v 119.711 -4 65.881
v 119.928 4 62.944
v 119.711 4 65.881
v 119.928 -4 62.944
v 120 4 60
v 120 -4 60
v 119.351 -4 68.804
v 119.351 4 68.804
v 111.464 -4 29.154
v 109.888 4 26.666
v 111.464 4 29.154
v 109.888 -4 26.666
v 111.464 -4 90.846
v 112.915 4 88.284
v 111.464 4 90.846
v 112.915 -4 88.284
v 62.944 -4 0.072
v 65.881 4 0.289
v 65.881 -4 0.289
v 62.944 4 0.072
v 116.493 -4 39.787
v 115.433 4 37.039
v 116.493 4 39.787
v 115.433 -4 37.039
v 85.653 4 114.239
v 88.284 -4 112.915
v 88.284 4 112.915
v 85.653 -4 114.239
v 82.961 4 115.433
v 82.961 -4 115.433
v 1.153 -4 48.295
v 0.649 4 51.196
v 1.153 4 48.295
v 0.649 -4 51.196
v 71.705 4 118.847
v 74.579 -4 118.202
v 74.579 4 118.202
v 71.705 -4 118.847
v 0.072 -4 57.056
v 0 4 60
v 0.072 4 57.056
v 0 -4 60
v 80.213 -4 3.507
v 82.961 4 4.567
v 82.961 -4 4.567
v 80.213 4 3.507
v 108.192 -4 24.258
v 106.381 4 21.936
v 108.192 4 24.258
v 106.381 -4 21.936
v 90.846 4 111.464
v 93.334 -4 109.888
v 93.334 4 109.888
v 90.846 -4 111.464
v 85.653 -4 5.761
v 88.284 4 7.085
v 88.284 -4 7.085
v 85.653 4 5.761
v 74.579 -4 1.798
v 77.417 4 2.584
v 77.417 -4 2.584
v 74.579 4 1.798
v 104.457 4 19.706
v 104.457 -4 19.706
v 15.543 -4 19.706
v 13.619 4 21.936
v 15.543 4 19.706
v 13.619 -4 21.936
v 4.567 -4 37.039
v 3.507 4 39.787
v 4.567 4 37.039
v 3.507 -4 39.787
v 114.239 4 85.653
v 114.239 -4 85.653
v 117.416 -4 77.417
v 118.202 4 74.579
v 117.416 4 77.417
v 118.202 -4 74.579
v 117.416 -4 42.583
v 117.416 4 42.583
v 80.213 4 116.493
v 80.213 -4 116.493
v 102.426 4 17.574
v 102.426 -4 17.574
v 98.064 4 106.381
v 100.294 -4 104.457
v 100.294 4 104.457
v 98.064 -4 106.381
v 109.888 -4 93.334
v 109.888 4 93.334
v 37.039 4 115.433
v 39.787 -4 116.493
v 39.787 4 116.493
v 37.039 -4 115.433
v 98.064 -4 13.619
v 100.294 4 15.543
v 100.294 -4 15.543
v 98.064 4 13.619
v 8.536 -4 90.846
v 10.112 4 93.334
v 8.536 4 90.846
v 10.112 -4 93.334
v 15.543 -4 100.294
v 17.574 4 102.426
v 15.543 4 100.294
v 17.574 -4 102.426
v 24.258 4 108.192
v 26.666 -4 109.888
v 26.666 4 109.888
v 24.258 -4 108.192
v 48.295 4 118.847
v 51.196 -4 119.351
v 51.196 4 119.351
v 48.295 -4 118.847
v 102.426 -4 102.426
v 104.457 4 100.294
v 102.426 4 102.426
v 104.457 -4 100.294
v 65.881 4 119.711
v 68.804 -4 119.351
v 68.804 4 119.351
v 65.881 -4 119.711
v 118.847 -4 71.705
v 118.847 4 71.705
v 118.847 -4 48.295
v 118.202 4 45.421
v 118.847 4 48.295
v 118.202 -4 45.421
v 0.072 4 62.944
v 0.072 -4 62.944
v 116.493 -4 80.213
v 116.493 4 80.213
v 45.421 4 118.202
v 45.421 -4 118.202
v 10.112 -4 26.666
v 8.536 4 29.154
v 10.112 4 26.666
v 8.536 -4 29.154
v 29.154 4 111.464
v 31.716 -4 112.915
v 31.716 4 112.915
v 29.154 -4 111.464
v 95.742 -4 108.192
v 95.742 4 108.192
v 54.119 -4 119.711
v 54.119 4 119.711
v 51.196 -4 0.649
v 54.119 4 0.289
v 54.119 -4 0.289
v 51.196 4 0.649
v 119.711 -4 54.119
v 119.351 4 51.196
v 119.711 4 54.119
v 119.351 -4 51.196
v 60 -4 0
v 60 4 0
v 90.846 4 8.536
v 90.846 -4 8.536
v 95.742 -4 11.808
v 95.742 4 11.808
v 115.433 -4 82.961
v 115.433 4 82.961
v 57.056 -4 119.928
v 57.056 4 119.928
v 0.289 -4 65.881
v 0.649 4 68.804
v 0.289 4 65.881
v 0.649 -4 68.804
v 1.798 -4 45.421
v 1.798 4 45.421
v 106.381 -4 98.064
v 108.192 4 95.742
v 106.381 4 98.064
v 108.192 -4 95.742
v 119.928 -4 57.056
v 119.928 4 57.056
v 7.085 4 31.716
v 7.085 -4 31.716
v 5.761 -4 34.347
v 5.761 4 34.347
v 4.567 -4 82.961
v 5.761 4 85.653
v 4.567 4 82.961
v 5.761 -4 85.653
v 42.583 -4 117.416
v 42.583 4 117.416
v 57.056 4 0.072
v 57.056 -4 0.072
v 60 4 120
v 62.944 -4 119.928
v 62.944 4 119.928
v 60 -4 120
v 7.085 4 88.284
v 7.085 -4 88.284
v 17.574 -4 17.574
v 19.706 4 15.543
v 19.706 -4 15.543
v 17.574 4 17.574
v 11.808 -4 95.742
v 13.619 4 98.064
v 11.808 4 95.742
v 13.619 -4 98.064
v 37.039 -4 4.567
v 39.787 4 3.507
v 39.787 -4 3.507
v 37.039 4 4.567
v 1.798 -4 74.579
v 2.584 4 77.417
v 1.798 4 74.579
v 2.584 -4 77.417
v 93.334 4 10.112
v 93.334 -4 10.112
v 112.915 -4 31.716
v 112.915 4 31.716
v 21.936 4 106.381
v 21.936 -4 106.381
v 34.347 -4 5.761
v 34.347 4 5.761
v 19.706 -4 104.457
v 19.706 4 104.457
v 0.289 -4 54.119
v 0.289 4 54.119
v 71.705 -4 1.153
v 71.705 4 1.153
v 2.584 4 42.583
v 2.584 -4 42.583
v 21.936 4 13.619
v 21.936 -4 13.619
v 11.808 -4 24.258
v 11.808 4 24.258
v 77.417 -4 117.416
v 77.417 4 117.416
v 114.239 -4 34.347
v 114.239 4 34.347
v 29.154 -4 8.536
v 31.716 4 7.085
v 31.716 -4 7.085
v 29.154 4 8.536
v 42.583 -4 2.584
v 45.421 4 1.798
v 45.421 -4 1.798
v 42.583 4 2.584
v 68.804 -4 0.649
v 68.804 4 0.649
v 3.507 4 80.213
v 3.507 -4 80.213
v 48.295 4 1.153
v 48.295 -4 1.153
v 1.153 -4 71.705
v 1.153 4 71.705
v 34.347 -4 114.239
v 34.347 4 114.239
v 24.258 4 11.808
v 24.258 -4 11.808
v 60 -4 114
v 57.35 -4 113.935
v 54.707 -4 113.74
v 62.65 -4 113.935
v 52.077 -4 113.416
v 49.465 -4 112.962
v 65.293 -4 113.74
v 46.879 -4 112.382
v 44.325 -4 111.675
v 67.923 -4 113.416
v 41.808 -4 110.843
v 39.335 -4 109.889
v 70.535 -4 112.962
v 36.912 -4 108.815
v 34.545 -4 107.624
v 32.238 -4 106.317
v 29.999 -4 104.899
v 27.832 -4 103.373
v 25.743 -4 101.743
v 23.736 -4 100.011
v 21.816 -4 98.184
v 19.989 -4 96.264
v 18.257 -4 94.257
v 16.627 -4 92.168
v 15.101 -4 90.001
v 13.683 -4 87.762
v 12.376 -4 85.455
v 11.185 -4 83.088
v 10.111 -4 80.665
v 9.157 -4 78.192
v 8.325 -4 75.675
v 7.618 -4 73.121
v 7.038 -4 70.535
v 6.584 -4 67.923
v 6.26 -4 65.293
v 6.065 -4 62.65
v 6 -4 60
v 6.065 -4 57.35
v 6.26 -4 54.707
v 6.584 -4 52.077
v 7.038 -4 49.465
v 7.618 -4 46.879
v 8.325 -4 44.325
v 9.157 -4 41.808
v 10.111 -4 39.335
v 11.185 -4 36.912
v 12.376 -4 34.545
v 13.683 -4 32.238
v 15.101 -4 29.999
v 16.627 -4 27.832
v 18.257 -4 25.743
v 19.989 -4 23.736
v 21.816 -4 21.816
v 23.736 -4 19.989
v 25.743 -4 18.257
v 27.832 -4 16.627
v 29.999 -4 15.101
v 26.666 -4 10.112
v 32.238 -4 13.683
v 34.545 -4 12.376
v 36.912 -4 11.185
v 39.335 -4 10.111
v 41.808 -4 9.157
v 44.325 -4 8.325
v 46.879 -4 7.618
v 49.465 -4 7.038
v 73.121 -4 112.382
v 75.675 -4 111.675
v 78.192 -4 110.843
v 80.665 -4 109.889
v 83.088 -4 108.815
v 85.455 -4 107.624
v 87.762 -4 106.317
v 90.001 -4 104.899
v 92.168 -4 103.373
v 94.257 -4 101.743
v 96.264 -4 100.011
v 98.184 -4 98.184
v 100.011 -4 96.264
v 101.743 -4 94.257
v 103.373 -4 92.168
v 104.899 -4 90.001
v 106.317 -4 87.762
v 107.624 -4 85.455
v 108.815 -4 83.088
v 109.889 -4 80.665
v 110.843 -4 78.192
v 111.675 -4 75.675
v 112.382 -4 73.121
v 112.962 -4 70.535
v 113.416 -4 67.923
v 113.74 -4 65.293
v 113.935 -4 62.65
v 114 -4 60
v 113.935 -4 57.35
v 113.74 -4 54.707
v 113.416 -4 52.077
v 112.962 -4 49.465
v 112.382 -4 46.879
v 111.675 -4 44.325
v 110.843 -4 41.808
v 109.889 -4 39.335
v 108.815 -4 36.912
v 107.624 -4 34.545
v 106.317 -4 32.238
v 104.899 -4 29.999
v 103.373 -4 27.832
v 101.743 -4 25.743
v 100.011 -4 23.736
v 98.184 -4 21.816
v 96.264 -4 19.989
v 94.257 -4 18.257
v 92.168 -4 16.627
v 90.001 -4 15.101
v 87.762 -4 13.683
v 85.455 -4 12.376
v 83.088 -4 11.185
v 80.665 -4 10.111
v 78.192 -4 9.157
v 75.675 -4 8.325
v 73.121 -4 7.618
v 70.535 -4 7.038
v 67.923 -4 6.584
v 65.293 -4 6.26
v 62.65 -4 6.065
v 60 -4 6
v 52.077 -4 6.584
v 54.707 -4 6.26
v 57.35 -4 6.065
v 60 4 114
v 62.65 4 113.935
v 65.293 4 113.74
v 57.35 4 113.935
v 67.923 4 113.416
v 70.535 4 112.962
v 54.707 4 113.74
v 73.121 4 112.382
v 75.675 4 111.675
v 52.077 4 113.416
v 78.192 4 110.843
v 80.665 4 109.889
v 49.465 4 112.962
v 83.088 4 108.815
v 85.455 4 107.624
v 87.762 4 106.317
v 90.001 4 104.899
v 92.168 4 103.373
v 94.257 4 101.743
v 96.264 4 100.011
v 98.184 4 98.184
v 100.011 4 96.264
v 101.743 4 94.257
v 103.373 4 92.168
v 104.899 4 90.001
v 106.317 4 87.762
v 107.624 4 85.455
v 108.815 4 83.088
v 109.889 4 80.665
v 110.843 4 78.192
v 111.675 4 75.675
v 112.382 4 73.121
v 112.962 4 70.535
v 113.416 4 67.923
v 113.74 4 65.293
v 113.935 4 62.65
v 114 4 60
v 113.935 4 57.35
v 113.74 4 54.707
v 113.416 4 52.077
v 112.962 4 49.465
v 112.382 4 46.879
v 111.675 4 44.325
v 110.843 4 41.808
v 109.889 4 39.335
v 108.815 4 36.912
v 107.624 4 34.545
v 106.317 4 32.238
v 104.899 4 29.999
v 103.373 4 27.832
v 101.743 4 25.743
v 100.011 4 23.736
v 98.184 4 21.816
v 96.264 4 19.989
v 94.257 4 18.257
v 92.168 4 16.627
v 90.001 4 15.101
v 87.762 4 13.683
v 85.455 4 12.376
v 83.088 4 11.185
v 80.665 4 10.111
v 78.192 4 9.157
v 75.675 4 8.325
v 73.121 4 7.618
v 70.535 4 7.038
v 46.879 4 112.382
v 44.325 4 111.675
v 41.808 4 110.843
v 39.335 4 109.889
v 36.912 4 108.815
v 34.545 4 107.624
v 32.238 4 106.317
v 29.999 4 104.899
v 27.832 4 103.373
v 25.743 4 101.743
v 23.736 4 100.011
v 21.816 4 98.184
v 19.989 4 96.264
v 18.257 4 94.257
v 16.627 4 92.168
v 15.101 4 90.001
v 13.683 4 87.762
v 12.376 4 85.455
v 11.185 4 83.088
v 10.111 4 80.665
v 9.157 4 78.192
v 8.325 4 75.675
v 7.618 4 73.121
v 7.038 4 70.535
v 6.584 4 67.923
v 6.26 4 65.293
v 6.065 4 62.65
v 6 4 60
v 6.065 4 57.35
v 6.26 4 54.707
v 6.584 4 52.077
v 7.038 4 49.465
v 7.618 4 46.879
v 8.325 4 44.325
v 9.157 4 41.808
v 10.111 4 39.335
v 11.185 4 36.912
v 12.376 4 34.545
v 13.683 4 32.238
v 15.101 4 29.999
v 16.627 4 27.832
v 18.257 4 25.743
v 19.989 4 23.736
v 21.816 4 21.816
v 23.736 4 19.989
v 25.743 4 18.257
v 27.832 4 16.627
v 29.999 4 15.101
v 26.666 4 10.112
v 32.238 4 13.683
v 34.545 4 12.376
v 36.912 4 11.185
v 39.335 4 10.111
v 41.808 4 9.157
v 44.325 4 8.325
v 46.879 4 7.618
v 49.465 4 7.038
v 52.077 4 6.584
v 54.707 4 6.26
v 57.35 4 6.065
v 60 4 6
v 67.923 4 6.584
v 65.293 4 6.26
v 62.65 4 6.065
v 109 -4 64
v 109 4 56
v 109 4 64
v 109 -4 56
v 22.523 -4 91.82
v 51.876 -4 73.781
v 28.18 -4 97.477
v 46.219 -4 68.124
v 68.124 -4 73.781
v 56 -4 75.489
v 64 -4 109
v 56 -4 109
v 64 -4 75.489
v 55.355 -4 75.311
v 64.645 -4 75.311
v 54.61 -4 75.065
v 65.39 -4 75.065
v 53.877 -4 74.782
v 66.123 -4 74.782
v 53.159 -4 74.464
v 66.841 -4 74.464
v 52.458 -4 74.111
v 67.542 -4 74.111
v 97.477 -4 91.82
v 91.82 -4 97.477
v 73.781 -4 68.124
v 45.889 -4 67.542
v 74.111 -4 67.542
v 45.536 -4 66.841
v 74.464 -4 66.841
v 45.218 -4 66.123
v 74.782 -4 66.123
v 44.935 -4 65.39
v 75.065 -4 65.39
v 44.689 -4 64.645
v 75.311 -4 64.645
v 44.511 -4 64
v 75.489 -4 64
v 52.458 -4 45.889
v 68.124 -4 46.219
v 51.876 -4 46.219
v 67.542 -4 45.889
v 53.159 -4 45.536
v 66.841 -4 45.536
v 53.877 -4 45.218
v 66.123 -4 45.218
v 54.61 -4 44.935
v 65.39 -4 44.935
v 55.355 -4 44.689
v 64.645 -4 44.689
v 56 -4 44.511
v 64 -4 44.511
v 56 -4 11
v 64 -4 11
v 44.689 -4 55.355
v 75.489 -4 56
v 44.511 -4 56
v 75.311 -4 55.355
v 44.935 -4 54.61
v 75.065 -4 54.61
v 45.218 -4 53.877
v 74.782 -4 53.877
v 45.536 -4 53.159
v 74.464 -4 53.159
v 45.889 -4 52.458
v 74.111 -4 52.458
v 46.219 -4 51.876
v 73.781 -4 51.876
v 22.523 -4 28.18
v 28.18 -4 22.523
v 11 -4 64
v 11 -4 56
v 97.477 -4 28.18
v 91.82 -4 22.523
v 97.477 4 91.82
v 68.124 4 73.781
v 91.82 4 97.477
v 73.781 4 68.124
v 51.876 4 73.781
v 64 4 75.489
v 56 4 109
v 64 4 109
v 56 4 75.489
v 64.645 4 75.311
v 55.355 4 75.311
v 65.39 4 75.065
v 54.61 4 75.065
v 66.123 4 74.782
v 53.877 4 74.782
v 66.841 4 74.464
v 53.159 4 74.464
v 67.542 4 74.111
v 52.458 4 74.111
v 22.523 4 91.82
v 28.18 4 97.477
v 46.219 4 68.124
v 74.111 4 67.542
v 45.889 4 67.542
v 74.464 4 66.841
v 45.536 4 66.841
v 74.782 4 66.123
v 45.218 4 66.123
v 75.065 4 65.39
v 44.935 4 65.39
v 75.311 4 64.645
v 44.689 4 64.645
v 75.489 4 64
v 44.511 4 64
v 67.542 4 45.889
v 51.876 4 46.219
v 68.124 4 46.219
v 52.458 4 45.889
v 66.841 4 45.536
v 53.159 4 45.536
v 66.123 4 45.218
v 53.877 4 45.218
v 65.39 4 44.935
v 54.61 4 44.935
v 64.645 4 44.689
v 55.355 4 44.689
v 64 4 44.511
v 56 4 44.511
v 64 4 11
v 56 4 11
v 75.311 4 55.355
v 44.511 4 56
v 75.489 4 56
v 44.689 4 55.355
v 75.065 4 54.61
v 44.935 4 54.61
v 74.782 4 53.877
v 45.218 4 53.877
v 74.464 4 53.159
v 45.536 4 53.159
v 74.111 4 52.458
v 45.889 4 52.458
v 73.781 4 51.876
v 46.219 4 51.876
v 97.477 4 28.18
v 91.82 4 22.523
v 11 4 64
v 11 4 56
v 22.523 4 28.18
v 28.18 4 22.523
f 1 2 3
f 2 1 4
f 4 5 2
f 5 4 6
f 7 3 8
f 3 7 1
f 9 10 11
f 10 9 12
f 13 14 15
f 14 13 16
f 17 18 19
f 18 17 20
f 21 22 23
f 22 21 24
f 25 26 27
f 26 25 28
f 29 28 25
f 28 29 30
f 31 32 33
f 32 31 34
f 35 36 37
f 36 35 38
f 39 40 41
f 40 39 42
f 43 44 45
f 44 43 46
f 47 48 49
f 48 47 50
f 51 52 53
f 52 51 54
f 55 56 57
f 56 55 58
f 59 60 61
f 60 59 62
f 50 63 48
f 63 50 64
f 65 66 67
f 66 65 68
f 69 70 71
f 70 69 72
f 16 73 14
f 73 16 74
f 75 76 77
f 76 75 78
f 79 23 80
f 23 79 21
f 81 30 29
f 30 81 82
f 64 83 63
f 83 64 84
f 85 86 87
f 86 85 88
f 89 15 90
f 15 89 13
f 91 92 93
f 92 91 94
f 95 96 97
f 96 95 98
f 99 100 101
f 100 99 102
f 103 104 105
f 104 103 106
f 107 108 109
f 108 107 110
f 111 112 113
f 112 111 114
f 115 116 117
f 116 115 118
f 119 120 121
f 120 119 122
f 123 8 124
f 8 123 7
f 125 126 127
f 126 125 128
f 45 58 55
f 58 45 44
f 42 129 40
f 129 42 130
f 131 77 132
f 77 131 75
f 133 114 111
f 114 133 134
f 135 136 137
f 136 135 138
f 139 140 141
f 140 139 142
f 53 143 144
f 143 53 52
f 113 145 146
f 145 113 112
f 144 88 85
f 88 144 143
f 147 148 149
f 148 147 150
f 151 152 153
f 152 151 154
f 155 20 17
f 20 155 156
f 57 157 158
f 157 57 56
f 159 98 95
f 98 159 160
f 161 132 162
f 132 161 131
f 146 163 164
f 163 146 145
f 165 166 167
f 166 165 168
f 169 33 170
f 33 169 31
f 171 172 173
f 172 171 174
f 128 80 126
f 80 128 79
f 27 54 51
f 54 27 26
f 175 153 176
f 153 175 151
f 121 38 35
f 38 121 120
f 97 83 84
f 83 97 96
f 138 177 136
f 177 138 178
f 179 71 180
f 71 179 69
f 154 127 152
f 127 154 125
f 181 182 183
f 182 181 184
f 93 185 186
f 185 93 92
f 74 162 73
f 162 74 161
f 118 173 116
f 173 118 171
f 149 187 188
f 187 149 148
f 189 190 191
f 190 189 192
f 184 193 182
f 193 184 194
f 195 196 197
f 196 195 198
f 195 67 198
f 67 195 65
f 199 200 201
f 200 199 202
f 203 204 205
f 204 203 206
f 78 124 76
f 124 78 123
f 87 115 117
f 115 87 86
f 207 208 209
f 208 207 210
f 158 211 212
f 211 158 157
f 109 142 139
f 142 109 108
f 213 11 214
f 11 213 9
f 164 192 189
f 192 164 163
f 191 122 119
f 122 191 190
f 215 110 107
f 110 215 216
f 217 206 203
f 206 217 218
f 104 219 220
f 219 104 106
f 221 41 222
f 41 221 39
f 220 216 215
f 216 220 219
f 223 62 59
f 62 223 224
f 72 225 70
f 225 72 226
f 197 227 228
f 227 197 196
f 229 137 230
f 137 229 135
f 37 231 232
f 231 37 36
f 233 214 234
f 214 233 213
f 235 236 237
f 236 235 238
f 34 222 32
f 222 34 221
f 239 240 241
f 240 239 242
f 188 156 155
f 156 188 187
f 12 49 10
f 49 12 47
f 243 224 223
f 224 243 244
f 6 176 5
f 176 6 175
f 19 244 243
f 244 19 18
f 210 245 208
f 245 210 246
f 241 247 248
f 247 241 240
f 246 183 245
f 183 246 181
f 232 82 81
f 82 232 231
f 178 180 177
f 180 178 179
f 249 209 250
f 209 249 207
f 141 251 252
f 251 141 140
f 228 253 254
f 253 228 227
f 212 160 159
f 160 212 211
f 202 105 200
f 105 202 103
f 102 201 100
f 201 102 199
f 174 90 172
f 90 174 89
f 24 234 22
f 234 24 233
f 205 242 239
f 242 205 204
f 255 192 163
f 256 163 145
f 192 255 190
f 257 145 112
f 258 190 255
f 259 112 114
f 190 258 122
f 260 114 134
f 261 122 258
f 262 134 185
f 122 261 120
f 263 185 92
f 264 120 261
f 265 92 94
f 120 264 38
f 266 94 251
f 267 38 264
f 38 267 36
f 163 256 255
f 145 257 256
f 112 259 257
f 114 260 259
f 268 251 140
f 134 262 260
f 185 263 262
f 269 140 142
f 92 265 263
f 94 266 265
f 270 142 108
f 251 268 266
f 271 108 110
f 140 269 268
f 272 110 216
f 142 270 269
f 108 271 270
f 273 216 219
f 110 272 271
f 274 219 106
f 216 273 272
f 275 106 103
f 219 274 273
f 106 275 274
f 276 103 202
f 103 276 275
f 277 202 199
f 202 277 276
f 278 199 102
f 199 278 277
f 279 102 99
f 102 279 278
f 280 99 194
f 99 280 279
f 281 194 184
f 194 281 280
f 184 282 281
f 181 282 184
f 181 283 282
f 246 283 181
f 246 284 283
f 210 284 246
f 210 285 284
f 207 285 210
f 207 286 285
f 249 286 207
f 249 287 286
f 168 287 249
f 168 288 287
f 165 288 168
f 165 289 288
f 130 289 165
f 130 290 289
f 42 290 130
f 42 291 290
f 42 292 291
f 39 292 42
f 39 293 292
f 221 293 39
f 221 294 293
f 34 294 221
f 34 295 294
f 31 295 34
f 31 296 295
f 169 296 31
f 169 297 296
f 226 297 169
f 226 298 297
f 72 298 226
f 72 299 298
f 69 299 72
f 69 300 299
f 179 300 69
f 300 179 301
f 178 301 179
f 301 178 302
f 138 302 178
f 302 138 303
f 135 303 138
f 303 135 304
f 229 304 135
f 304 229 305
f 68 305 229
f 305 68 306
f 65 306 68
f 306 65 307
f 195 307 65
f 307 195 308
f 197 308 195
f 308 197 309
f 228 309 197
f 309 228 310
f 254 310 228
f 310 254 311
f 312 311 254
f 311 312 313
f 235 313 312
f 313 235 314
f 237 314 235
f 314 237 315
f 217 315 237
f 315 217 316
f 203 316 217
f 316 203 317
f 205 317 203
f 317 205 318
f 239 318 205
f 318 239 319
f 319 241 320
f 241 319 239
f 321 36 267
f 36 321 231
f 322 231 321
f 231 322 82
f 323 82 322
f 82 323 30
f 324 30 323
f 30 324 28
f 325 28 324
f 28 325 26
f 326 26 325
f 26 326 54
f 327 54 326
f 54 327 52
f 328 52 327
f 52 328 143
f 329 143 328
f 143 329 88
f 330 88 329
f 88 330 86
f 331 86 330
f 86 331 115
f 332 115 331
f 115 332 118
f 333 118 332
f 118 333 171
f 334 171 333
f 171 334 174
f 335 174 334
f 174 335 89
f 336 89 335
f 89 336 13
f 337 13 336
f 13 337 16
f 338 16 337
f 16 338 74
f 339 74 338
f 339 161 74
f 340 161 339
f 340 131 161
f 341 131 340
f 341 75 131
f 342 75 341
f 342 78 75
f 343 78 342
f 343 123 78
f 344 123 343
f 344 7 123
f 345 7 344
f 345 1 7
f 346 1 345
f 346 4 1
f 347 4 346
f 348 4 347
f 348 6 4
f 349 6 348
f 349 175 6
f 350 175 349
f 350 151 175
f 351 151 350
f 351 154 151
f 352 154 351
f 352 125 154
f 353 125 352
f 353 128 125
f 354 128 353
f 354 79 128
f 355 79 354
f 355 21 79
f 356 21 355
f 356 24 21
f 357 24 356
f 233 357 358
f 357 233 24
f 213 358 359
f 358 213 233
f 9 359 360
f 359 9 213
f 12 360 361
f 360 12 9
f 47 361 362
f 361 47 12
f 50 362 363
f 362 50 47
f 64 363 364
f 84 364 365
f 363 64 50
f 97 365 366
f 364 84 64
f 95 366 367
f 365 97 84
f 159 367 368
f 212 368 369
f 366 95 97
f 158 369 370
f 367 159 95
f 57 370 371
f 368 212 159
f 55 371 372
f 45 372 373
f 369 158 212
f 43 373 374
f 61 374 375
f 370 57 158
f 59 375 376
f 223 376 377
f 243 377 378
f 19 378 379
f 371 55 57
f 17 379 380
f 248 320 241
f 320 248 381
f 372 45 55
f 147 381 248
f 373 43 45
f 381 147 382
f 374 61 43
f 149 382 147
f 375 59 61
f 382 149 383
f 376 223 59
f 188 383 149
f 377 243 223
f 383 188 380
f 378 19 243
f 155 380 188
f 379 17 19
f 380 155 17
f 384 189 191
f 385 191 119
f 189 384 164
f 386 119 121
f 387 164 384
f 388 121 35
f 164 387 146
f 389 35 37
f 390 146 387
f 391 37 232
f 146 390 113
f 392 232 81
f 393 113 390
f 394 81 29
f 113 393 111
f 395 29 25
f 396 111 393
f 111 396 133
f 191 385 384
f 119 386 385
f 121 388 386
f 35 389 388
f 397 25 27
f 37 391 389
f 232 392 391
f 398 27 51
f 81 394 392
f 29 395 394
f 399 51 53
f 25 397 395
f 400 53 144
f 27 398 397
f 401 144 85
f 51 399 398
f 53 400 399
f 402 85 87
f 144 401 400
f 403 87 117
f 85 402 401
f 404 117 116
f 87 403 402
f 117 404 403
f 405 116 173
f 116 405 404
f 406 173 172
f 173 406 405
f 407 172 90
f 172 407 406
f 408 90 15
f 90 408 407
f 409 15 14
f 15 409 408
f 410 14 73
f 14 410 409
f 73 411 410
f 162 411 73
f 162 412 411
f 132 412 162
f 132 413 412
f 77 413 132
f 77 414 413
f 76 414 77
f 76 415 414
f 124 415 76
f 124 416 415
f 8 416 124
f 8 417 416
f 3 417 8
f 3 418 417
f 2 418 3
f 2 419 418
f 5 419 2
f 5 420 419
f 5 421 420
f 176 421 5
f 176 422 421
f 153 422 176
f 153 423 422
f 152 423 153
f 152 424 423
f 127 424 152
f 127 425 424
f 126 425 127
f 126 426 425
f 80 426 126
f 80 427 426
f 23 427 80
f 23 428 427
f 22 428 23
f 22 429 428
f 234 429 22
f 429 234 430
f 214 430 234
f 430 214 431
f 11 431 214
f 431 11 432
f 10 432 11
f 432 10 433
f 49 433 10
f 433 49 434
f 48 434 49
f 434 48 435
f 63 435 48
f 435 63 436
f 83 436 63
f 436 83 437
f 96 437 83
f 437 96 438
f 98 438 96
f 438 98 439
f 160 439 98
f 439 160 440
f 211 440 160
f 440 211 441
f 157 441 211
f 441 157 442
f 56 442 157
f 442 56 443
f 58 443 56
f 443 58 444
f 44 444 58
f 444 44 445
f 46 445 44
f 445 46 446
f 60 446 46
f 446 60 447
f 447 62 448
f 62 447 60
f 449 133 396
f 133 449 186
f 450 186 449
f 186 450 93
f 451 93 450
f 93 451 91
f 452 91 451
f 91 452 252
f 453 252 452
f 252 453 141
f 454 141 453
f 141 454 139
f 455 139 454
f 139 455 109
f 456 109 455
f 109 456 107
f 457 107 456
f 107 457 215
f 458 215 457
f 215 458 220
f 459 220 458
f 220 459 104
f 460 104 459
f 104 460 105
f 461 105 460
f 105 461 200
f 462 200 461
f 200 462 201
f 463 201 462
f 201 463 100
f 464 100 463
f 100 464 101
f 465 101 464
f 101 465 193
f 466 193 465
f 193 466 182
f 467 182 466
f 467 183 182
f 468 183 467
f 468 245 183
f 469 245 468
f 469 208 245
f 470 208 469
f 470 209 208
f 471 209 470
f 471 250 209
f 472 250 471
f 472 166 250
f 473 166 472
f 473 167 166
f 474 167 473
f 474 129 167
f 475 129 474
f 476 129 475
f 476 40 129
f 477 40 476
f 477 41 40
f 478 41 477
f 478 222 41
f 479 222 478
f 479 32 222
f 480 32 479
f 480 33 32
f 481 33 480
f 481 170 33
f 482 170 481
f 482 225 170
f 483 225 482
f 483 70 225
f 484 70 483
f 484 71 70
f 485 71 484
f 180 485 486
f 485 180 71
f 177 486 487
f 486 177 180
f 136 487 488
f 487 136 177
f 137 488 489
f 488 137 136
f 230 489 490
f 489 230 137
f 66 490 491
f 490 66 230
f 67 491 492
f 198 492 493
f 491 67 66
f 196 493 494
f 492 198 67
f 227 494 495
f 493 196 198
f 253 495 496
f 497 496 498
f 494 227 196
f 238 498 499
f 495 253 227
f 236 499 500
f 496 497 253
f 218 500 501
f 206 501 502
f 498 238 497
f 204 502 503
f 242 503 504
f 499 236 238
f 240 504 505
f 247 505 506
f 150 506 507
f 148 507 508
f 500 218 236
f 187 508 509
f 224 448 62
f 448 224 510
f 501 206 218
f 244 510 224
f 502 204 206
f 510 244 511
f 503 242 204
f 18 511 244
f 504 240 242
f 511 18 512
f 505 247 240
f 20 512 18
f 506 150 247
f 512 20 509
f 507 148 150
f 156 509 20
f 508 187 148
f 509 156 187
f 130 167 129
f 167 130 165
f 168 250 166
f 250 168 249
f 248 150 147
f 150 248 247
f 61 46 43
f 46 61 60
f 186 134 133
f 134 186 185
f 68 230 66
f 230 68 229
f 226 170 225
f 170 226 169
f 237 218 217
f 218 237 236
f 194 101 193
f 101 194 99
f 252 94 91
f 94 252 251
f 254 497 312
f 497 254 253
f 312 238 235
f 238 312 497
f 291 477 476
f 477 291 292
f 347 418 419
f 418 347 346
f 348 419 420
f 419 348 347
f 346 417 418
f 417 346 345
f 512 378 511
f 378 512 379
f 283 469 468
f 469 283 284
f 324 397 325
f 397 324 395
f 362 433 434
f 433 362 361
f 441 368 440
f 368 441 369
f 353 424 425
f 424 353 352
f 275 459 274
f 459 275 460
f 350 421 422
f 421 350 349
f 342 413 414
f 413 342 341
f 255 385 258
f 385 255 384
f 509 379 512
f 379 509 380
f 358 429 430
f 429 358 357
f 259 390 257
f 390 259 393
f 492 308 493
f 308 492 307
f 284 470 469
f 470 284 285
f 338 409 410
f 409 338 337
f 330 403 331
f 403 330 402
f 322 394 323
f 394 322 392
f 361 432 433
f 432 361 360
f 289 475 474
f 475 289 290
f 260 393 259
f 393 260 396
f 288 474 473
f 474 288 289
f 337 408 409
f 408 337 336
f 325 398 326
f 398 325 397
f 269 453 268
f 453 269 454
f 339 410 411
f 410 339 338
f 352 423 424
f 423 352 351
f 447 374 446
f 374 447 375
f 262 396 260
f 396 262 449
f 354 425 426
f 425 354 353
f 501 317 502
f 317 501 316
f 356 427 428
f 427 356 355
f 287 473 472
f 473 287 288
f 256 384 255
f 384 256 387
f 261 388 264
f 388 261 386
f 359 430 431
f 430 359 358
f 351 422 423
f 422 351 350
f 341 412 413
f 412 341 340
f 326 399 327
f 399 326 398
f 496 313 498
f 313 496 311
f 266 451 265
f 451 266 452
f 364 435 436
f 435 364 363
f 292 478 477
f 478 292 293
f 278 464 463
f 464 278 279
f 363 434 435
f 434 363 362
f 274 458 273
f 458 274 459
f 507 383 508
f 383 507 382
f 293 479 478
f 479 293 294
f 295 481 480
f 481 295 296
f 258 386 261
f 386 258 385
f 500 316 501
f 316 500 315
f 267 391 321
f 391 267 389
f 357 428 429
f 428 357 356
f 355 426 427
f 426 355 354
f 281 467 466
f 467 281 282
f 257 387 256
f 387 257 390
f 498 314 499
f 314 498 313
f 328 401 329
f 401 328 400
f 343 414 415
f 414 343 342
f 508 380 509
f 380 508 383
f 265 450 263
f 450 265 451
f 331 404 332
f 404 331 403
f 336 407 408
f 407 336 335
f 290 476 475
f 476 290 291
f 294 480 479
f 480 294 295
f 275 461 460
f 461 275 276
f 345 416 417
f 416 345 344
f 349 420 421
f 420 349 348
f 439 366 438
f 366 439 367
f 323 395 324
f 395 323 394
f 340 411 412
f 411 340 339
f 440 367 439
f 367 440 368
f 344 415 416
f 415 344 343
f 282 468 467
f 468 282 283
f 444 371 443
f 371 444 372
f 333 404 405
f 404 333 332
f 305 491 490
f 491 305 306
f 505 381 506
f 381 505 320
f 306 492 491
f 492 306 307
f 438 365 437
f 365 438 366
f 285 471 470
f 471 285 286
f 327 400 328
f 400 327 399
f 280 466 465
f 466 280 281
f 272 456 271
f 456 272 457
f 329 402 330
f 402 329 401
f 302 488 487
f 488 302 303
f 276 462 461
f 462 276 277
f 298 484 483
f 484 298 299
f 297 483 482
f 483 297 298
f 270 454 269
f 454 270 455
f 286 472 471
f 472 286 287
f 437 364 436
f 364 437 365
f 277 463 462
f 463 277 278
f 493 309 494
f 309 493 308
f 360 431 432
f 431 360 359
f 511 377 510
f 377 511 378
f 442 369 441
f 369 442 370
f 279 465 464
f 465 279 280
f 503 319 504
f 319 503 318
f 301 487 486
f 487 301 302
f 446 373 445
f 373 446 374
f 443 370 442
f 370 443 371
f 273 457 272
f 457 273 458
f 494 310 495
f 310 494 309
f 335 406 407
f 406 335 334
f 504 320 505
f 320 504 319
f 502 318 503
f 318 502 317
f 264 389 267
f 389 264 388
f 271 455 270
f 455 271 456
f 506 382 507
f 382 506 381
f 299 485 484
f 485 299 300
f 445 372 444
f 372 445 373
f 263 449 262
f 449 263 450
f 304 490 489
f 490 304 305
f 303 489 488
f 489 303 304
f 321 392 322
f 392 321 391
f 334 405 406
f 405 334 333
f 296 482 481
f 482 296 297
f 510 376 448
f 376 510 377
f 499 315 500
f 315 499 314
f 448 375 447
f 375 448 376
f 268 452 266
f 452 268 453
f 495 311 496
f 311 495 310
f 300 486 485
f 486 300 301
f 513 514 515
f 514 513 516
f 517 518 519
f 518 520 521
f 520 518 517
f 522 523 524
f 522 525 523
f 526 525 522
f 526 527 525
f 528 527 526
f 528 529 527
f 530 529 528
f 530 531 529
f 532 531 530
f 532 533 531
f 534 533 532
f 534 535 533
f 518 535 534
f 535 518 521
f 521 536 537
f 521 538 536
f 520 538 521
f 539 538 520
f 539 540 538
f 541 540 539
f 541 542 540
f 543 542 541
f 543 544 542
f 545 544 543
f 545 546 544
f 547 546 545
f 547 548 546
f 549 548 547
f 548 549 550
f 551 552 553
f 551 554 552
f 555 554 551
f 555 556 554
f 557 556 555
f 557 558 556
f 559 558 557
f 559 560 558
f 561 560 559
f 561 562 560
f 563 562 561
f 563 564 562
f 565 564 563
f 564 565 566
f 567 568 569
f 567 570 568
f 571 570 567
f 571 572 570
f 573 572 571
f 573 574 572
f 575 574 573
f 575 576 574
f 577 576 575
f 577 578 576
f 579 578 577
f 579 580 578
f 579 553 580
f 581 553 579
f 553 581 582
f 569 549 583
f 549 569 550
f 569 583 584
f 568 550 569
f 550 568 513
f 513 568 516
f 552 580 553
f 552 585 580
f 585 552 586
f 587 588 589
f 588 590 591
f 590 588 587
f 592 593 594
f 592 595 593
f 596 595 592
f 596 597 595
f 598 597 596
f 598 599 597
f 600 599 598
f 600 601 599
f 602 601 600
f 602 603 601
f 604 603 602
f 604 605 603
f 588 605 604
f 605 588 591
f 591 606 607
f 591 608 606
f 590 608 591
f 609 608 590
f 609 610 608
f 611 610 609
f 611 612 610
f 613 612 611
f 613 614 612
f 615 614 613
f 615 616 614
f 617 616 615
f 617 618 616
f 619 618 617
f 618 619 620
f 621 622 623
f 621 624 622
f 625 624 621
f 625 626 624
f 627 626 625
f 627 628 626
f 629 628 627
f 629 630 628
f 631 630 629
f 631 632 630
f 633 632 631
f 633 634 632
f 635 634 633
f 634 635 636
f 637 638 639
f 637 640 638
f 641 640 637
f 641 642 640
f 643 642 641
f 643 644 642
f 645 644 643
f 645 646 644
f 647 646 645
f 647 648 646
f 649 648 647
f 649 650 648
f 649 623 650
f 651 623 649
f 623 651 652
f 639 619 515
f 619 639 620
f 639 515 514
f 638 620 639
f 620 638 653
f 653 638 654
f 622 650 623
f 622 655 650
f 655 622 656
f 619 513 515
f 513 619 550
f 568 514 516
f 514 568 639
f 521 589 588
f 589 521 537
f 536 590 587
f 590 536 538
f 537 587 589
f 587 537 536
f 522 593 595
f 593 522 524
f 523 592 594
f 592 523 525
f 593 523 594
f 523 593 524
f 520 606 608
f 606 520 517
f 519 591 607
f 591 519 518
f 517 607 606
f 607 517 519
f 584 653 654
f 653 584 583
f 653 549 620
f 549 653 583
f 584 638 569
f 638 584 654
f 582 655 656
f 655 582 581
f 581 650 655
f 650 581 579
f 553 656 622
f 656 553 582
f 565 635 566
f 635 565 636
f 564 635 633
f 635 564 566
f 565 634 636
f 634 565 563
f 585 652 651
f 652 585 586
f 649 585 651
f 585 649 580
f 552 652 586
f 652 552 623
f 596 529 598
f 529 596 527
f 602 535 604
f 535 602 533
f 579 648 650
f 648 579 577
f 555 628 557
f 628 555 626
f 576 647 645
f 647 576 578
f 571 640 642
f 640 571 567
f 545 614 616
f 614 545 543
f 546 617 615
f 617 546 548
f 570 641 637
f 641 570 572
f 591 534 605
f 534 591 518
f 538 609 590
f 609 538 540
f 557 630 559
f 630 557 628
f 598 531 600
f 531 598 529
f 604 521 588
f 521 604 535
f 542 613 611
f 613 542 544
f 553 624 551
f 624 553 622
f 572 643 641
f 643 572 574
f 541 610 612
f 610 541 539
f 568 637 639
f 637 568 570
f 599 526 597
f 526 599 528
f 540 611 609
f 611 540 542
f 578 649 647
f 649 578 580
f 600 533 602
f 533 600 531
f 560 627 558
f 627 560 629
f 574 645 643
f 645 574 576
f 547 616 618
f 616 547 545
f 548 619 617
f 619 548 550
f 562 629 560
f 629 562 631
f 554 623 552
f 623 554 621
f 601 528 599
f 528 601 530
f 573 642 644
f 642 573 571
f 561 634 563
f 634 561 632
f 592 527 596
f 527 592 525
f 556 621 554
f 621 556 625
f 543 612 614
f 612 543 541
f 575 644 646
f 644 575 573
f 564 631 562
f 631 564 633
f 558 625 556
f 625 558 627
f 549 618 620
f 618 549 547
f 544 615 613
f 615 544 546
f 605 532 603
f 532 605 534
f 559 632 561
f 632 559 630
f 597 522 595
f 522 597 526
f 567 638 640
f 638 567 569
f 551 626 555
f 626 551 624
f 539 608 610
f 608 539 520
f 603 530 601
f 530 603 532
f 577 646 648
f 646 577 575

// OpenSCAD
$fn=128;
/* doodle-meta {"version":1,"parameters":{"outer_diameter":{"label":"Outer diameter","description":"Outer rim diameter","unit":"mm"},"hub_diameter":{"label":"Hub","description":"Hub diameter","unit":"mm"},"spoke_width":{"label":"Spoke width","description":"Spoke bar thickness","unit":"mm"}}} */
// Wheel lies in XZ. BROKEN: spokes stop 5 mm short of the rim inner wall.
outer_diameter = 120; // mm
rim_inner_diameter = 108; // mm
hub_diameter = 32; // mm
thickness = 8; // mm
spoke_count = 8; // count
spoke_width = 8; // mm
spoke_reach = 34; // mm from hub overlap start; stops short of the rim
translate([outer_diameter/2,thickness/2,outer_diameter/2]) rotate([90,0,0]) union(){
  difference(){cylinder(d=outer_diameter,h=thickness);translate([0,0,-1])cylinder(d=rim_inner_diameter,h=thickness+2);}
  cylinder(d=hub_diameter,h=thickness);
  for(a=[0:360/spoke_count:360-360/spoke_count])rotate([0,0,a])translate([hub_diameter/2-1,-thickness/2,0])cube([spoke_reach,thickness,thickness]);
}
